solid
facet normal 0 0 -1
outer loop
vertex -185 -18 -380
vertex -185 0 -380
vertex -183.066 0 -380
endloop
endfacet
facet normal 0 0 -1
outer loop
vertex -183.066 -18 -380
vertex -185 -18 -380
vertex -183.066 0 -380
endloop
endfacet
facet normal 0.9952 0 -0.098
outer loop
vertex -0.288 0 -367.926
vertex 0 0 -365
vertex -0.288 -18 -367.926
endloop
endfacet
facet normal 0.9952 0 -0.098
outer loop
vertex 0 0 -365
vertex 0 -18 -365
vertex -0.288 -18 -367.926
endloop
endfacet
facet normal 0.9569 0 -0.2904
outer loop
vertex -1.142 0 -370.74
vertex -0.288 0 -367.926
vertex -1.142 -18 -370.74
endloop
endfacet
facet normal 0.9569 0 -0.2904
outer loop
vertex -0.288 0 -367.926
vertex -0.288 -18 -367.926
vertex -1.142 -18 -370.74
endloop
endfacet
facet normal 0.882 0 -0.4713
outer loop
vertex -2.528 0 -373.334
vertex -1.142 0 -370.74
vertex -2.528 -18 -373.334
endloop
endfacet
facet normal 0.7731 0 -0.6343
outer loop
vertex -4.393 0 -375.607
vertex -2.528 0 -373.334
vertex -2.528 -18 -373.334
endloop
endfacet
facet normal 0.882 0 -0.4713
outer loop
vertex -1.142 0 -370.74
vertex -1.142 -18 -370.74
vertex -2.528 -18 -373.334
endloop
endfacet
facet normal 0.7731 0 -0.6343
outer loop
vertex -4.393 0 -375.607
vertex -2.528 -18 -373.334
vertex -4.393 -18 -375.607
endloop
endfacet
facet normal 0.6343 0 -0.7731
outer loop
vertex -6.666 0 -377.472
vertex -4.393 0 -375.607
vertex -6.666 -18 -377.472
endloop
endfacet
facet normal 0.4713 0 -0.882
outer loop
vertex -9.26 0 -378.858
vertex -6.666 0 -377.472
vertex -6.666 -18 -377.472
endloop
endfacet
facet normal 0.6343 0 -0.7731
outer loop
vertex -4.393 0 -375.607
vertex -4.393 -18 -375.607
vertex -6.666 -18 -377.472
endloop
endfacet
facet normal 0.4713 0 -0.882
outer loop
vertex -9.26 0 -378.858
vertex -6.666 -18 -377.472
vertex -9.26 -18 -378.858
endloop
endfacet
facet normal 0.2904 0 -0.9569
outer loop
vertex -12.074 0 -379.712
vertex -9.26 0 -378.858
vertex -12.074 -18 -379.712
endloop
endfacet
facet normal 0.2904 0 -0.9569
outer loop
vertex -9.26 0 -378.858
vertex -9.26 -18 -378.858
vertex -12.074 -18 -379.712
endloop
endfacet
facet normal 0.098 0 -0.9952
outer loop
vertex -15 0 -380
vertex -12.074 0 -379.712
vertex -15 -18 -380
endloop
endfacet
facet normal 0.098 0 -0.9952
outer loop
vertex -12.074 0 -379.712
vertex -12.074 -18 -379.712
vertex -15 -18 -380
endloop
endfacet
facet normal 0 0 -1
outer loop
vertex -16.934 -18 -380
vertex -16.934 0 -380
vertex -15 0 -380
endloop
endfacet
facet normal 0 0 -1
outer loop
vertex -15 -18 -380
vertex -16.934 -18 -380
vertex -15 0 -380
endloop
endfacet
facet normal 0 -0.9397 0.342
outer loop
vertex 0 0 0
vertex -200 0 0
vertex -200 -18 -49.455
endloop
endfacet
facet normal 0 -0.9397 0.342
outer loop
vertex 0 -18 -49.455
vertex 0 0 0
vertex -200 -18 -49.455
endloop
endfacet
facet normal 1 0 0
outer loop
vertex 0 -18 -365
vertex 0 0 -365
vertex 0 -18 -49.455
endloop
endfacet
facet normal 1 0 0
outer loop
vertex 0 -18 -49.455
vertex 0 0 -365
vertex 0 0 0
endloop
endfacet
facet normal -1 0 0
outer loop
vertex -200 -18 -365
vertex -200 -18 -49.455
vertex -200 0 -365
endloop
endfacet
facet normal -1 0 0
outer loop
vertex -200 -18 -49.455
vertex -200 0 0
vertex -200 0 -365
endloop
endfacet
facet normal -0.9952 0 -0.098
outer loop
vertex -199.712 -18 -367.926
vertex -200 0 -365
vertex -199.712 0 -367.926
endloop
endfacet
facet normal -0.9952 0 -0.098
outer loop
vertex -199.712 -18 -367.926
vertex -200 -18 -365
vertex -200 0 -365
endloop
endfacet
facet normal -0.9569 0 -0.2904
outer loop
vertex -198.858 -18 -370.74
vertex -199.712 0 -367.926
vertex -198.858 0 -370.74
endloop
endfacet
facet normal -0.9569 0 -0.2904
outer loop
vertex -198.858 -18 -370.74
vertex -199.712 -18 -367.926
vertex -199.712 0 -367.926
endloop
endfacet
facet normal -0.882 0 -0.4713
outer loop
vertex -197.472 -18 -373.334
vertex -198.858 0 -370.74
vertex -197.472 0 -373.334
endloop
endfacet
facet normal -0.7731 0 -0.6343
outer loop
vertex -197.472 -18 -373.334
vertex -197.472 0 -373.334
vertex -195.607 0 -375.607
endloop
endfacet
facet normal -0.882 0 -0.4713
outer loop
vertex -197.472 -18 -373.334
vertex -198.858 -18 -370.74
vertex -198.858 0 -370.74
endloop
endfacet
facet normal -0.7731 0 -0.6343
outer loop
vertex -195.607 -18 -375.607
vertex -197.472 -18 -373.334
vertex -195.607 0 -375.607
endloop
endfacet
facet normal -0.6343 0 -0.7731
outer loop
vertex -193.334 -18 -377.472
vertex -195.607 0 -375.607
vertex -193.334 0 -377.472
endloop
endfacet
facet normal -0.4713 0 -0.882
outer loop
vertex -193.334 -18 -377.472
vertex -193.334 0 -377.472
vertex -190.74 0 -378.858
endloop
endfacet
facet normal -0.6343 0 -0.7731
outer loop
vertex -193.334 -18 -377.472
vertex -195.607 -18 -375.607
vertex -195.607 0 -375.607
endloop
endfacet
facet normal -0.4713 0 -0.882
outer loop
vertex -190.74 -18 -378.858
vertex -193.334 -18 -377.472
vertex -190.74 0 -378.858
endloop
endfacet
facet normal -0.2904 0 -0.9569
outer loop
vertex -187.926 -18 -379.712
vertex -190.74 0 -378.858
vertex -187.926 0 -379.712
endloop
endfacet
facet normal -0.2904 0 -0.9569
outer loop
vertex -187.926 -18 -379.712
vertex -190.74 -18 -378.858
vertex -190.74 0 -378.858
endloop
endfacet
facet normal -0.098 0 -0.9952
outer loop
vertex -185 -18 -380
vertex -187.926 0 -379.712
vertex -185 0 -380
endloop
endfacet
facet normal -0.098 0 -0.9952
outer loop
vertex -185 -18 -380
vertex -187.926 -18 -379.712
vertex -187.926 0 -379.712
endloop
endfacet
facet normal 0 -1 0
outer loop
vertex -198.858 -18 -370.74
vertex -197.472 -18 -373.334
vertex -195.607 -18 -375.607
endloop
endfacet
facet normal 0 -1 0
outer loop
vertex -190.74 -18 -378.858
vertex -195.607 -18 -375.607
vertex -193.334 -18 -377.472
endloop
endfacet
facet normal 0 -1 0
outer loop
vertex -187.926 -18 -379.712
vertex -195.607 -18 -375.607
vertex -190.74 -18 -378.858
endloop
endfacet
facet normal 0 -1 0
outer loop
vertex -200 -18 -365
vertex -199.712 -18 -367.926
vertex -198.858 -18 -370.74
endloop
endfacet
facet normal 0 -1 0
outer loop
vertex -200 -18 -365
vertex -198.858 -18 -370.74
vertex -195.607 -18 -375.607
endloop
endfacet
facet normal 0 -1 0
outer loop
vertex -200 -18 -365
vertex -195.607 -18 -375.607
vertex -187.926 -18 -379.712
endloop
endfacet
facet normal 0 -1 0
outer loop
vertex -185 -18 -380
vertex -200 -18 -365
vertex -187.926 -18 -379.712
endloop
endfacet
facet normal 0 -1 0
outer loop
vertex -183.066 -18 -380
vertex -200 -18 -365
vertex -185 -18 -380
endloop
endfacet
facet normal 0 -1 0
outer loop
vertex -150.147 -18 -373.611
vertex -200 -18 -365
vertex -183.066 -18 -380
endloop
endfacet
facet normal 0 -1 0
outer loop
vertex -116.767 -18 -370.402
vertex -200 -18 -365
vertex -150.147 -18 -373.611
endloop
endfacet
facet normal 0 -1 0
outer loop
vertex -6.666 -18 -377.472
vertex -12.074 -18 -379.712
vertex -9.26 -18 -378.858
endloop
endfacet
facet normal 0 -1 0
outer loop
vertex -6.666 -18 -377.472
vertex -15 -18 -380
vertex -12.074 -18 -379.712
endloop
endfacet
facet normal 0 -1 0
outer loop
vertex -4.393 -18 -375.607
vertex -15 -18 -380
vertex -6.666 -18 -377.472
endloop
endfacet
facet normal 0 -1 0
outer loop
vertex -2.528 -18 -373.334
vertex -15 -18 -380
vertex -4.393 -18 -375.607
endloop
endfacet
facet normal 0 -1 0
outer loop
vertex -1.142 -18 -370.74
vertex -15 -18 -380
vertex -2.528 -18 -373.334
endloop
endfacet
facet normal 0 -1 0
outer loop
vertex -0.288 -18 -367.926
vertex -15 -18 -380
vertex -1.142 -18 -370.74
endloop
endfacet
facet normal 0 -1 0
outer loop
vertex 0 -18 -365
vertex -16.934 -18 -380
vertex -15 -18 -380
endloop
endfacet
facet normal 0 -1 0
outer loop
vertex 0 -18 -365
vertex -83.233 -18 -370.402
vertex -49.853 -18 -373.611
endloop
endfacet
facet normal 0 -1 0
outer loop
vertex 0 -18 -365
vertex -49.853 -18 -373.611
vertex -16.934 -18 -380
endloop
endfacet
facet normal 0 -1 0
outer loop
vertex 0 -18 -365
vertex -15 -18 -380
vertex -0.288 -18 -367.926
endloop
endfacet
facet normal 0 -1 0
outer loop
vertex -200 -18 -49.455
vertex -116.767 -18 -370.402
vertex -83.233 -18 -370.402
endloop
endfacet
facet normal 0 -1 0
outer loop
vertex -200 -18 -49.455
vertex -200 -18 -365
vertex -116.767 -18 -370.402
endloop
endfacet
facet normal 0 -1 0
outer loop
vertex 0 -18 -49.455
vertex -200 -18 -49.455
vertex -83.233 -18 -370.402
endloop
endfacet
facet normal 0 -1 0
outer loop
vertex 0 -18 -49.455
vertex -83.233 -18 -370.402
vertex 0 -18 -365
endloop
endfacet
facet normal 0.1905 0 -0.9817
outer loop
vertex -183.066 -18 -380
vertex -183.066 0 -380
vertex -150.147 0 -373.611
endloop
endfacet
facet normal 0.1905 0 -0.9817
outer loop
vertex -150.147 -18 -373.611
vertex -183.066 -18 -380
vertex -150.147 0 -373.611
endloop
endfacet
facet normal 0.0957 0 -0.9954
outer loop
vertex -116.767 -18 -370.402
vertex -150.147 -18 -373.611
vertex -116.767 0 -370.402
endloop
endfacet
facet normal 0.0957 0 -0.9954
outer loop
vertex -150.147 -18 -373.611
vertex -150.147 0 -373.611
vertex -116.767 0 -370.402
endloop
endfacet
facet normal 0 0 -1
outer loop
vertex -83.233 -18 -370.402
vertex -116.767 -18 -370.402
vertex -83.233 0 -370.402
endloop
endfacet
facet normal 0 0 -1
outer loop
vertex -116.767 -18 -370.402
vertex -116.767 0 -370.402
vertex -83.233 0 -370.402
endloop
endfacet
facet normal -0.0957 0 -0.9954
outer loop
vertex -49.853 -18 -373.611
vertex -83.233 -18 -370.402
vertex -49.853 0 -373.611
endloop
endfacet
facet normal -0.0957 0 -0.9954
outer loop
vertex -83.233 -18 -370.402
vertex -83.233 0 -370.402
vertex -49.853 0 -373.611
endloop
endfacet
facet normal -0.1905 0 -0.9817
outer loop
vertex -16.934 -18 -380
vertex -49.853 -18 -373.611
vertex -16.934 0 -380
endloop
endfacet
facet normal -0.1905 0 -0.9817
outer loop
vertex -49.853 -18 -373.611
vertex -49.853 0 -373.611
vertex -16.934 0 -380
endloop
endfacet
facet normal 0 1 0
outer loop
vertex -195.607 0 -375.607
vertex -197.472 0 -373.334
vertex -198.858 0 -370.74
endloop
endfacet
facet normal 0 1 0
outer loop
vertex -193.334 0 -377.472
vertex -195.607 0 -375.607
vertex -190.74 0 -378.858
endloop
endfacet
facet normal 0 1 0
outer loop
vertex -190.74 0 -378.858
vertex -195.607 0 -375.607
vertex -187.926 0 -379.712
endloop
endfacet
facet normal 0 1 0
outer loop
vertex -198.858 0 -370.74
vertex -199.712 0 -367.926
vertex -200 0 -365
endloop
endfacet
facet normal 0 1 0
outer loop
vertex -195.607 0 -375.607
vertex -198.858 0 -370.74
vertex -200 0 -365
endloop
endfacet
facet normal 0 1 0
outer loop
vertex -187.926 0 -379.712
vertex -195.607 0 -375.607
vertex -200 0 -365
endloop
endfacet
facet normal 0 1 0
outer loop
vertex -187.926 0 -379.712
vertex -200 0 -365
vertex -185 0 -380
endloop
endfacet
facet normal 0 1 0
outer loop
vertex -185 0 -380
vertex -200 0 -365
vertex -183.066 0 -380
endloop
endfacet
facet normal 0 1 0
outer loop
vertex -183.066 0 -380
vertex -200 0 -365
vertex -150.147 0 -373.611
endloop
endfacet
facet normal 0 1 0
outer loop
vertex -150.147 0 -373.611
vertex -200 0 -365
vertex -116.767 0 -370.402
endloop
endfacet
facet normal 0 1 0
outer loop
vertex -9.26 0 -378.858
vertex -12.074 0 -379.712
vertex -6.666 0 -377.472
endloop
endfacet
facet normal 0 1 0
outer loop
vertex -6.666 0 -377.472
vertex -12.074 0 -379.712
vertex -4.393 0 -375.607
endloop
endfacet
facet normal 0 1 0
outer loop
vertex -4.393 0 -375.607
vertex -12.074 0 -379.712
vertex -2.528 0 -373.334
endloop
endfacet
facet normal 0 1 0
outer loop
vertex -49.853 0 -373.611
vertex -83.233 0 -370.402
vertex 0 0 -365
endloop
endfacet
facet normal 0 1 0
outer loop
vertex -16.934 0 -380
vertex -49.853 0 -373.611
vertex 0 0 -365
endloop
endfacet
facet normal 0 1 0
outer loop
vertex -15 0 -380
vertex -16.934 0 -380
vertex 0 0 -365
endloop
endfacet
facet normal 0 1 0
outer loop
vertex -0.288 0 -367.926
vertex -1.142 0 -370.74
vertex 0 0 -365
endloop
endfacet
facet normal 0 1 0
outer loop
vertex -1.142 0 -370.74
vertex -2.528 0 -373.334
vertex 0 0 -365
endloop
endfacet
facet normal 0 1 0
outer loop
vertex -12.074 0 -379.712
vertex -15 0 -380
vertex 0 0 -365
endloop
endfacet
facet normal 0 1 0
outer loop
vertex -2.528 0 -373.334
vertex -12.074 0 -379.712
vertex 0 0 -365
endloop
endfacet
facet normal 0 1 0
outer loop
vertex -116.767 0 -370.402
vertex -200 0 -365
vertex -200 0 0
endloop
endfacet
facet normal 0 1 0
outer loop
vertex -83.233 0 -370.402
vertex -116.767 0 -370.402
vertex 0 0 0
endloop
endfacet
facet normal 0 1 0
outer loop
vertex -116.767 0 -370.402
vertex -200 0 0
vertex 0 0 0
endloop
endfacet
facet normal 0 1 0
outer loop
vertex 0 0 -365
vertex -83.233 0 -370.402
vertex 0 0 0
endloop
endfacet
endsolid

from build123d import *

# Parameters (mm, degrees)
F1_DEPTH = 18
F3_DEPTH = 200
F4_R     = 15


with BuildPart() as f1:
    # F0 (on Front) → F1 (new body)
    with BuildSketch(Plane.XZ):
        with BuildLine():
            Line((0, -380), (0, 0))
            Line((0, 0), (-200, 0))
            Line((-200, 0), (-200, -380))
            Line((-200, -380), (-183.066239, -380))
            ThreePointArc((-183.066239, -380), (-100, -370), (-16.933761, -380))
            Line((-16.933761, -380), (0, -380))
        make_face()
    extrude(amount=F1_DEPTH)

    # F2 (on face) → F3 (cut, through all)
    with BuildSketch(Plane(origin=(-200, 0, 0), x_dir=(0, -1, 0), z_dir=(-1, 0, 0))):
        Polygon((18, -49.454594), (18, 0), (0, 0), align=None)
    extrude(amount=-F3_DEPTH, mode=Mode.SUBTRACT)

    # F4
    f4_edges = [f1.edges().sort_by_distance(p)[0] for p in [
        (-200, -9, -380),
        (0, -9, -380),
    ]]
    fillet(f4_edges, radius=F4_R)


solid = f1.part
